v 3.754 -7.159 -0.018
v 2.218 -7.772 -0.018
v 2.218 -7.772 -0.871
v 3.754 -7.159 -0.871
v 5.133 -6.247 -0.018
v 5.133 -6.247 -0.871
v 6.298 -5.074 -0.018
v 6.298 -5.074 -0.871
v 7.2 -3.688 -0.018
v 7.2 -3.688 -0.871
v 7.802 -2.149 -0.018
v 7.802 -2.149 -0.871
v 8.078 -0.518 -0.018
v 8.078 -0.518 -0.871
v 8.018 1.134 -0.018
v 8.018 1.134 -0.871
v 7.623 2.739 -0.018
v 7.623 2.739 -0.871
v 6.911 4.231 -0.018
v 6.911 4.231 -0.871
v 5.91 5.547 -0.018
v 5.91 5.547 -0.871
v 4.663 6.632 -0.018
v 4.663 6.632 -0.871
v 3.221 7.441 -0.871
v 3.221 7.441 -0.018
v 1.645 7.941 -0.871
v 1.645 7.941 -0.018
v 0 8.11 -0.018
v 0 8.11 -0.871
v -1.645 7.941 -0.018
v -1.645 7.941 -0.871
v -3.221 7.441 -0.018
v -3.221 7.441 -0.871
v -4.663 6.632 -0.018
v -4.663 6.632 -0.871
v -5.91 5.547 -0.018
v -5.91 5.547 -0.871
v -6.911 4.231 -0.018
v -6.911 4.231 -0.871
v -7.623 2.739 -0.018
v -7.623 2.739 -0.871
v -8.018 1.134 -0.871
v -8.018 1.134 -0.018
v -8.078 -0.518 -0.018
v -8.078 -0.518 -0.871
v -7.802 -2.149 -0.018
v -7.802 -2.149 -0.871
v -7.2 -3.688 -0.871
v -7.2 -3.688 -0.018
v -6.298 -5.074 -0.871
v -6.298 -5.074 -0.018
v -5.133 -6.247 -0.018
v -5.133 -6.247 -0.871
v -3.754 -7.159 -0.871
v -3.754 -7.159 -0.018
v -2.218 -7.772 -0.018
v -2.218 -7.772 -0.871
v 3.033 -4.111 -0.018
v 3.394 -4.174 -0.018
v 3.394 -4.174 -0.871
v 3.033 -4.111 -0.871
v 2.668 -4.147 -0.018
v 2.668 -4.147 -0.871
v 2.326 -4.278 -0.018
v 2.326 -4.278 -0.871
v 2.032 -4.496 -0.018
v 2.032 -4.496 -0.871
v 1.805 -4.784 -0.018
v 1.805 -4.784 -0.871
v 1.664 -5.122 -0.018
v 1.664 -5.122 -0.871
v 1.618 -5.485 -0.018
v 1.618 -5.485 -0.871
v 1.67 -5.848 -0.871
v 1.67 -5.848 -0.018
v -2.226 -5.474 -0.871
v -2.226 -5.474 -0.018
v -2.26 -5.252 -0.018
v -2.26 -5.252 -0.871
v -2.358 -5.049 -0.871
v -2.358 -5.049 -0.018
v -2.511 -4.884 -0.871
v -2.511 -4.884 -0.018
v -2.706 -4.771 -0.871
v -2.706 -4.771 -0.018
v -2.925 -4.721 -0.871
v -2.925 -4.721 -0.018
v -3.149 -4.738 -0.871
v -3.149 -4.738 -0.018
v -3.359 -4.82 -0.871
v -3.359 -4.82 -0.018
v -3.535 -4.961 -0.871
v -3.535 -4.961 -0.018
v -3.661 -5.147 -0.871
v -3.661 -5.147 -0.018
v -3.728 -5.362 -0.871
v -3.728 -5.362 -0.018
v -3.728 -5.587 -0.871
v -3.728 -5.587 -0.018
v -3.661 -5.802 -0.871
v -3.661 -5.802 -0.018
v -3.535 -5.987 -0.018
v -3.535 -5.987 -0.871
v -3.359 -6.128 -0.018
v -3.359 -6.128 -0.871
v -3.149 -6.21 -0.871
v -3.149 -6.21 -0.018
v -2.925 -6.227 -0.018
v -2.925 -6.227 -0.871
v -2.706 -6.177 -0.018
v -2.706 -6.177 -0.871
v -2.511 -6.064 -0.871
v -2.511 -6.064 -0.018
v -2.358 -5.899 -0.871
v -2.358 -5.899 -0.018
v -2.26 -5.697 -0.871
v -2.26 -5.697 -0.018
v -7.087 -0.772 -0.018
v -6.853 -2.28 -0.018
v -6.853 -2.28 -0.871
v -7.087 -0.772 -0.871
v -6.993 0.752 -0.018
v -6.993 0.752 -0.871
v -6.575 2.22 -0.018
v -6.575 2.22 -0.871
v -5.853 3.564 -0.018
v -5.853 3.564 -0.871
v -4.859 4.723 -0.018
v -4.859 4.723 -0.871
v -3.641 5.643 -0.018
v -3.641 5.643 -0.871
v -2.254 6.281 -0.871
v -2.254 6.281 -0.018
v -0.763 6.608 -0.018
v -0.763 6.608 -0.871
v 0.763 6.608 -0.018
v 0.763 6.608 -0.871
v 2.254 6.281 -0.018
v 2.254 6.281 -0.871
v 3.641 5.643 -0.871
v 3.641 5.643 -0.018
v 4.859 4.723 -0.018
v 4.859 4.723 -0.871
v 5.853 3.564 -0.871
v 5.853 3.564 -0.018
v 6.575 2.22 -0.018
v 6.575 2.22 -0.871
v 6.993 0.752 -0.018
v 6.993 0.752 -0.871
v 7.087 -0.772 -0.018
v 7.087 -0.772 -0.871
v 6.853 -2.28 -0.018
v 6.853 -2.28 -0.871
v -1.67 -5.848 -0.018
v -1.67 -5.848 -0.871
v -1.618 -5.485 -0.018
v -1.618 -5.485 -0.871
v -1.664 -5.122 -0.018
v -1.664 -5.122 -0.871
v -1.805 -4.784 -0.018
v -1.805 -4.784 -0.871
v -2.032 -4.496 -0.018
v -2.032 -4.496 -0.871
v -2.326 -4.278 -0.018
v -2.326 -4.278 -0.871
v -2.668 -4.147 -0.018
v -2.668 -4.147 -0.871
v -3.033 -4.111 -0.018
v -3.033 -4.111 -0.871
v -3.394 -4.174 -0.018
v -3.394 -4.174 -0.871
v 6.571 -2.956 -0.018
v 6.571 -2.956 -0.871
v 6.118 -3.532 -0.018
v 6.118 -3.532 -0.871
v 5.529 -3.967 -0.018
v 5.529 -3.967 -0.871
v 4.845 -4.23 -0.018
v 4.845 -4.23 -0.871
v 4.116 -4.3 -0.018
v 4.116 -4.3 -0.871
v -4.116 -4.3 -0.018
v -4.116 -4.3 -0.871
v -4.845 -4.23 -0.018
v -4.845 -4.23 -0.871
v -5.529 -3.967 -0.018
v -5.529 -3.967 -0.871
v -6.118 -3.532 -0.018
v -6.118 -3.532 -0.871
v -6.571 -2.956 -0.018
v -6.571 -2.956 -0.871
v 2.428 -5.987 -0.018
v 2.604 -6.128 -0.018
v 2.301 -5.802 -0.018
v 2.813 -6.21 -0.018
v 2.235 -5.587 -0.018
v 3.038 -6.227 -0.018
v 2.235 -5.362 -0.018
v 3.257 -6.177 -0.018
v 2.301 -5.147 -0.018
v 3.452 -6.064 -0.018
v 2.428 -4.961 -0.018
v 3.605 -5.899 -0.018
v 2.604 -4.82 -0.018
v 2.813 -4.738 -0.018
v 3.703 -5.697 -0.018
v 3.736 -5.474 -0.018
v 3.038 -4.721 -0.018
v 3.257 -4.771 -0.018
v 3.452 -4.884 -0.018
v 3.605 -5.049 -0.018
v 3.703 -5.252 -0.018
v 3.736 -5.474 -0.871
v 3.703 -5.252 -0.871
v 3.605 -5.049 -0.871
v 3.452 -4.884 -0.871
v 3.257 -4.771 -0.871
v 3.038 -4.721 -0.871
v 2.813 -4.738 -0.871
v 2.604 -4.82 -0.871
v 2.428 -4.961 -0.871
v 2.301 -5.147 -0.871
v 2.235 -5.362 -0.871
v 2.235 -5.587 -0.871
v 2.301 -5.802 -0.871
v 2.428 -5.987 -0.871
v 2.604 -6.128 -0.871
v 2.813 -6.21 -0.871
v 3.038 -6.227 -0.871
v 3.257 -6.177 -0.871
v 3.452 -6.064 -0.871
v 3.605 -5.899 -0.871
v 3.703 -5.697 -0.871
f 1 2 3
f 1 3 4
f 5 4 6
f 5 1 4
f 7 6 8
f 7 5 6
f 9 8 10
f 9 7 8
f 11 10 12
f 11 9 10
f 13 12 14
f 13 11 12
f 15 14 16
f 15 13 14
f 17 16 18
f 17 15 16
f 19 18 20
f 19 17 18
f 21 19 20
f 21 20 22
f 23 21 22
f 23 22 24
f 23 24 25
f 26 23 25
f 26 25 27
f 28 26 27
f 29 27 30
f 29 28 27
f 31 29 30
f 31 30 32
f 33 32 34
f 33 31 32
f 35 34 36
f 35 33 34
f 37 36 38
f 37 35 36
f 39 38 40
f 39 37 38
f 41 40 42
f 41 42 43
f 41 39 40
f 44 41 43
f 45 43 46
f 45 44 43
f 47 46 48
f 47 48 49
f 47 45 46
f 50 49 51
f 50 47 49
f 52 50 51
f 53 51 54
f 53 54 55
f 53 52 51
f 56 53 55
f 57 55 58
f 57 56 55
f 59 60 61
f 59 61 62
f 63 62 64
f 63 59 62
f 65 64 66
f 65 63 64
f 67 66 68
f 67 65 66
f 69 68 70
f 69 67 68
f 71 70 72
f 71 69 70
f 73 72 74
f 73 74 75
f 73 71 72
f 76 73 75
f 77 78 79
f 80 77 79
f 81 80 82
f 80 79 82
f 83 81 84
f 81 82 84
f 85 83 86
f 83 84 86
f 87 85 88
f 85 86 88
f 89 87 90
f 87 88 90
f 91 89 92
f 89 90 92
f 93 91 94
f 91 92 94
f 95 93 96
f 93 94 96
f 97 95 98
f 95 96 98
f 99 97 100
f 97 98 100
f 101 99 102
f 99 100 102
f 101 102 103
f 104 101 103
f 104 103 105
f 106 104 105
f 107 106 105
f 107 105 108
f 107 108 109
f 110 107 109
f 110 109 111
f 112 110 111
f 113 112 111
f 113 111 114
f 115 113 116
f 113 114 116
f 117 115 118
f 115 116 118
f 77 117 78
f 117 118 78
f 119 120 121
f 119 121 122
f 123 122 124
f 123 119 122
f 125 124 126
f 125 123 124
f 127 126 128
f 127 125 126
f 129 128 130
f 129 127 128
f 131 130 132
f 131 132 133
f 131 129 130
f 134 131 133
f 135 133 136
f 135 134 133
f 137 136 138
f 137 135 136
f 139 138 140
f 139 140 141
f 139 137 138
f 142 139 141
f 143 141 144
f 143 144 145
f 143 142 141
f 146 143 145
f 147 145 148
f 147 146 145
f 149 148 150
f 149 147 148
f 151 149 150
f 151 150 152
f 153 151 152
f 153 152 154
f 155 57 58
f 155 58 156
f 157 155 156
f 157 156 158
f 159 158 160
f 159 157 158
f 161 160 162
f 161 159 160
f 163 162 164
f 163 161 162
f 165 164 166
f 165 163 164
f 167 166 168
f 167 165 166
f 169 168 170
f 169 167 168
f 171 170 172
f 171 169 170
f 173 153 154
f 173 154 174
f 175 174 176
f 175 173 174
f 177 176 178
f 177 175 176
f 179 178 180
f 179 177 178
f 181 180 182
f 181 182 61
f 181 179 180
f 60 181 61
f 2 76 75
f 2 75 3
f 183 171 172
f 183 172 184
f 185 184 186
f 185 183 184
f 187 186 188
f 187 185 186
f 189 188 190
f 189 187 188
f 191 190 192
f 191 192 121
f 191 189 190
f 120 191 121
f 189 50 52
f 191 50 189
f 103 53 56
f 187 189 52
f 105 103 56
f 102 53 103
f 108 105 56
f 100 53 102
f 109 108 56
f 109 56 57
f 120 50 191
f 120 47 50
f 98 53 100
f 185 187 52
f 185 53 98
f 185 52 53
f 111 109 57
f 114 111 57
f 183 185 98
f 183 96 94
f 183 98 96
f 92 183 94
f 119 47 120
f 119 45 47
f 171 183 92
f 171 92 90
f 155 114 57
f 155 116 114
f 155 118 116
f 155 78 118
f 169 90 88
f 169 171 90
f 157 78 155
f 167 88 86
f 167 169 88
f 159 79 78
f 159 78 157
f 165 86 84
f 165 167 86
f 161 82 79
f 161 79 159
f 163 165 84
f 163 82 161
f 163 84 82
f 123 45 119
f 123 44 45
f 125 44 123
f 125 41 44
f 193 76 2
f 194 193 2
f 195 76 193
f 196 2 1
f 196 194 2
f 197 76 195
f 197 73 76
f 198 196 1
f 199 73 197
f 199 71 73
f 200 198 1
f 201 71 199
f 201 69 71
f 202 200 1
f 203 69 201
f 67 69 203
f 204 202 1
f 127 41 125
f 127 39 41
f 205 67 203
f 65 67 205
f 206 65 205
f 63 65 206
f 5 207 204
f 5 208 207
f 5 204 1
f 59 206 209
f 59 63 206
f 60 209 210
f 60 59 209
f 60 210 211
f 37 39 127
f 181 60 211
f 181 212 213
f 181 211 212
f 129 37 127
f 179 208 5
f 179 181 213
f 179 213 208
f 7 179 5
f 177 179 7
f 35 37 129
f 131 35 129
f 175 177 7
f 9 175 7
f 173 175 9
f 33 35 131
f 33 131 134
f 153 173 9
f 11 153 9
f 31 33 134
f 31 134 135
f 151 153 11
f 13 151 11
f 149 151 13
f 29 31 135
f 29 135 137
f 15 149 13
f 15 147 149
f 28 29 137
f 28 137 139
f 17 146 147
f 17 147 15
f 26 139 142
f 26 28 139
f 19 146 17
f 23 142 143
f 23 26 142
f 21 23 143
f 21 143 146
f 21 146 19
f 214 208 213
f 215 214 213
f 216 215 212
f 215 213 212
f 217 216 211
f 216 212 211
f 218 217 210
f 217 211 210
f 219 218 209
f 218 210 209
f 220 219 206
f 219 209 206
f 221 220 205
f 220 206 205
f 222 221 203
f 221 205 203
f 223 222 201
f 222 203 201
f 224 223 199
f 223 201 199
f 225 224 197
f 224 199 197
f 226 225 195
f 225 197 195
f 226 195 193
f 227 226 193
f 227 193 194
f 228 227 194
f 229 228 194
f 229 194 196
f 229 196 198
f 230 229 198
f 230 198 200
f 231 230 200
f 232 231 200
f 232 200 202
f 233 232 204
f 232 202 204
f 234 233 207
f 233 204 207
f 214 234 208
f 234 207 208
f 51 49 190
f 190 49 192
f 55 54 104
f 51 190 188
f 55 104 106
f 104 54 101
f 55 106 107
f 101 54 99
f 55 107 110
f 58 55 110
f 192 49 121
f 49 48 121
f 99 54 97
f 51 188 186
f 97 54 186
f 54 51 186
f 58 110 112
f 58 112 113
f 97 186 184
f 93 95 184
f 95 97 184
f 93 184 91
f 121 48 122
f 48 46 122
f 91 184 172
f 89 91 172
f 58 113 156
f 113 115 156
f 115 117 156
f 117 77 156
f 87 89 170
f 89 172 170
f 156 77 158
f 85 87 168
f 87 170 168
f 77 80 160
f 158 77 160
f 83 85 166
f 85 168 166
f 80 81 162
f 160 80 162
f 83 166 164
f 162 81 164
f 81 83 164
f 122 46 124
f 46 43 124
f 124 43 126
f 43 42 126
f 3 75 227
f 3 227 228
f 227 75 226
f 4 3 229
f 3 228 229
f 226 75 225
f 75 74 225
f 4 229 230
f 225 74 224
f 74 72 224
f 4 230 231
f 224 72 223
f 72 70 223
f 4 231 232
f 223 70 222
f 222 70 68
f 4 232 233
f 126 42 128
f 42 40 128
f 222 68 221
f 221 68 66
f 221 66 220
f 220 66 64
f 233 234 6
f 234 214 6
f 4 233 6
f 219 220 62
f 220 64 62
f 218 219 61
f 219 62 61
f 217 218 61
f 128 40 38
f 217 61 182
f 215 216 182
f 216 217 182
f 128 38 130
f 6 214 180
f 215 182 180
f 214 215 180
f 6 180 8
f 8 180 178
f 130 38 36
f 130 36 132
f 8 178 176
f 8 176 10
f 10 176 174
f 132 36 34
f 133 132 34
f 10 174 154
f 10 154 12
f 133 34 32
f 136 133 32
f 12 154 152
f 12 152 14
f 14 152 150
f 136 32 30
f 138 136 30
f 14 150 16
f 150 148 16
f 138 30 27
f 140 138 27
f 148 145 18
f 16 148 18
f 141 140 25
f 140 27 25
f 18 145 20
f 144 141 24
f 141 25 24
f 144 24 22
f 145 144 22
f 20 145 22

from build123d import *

# Parameters (mm, degrees)
ESQUISSE1_R        = 0.75480164
BOSS_EXTRU_1_DEPTH = 0.8521954


with BuildPart() as part:
    # Esquisse1 → Boss.-Extru.1 (new body)
    with BuildSketch(Plane.XY.offset(-0.0184023)):
        with BuildLine():
            Line((-2.218240991, -7.772182242), (-1.669933881, -5.847622743))
            ThreePointArc((-1.669933881, -5.847622743), (-2.031629427, -4.49557761), (-3.39387782, -4.174440527))
            ThreePointArc((-3.39387782, -4.174440527), (-5.528675736, -3.967277273), (-6.85337913, -2.280434165))
            ThreePointArc((-6.85337913, -2.280434165), (0, 6.648799775), (6.85337913, -2.280434165))
            ThreePointArc((6.85337913, -2.280434165), (5.528675736, -3.967277273), (3.39387782, -4.174440527))
            ThreePointArc((3.39387782, -4.174440527), (2.031629427, -4.49557761), (1.669933881, -5.847622743))
            Line((1.669933881, -5.847622743), (2.218240991, -7.772182242))
            ThreePointArc((2.218240991, -7.772182242), (0, 8.109706175), (-2.218240991, -7.772182242))
        make_face()
        with Locations((2.981265606, -5.47402426)):
            Circle(ESQUISSE1_R, mode=Mode.SUBTRACT)
        with Locations((-2.981265606, -5.47402426)):
            Circle(ESQUISSE1_R, mode=Mode.SUBTRACT)
    extrude(amount=-BOSS_EXTRU_1_DEPTH)


solid = part.part
